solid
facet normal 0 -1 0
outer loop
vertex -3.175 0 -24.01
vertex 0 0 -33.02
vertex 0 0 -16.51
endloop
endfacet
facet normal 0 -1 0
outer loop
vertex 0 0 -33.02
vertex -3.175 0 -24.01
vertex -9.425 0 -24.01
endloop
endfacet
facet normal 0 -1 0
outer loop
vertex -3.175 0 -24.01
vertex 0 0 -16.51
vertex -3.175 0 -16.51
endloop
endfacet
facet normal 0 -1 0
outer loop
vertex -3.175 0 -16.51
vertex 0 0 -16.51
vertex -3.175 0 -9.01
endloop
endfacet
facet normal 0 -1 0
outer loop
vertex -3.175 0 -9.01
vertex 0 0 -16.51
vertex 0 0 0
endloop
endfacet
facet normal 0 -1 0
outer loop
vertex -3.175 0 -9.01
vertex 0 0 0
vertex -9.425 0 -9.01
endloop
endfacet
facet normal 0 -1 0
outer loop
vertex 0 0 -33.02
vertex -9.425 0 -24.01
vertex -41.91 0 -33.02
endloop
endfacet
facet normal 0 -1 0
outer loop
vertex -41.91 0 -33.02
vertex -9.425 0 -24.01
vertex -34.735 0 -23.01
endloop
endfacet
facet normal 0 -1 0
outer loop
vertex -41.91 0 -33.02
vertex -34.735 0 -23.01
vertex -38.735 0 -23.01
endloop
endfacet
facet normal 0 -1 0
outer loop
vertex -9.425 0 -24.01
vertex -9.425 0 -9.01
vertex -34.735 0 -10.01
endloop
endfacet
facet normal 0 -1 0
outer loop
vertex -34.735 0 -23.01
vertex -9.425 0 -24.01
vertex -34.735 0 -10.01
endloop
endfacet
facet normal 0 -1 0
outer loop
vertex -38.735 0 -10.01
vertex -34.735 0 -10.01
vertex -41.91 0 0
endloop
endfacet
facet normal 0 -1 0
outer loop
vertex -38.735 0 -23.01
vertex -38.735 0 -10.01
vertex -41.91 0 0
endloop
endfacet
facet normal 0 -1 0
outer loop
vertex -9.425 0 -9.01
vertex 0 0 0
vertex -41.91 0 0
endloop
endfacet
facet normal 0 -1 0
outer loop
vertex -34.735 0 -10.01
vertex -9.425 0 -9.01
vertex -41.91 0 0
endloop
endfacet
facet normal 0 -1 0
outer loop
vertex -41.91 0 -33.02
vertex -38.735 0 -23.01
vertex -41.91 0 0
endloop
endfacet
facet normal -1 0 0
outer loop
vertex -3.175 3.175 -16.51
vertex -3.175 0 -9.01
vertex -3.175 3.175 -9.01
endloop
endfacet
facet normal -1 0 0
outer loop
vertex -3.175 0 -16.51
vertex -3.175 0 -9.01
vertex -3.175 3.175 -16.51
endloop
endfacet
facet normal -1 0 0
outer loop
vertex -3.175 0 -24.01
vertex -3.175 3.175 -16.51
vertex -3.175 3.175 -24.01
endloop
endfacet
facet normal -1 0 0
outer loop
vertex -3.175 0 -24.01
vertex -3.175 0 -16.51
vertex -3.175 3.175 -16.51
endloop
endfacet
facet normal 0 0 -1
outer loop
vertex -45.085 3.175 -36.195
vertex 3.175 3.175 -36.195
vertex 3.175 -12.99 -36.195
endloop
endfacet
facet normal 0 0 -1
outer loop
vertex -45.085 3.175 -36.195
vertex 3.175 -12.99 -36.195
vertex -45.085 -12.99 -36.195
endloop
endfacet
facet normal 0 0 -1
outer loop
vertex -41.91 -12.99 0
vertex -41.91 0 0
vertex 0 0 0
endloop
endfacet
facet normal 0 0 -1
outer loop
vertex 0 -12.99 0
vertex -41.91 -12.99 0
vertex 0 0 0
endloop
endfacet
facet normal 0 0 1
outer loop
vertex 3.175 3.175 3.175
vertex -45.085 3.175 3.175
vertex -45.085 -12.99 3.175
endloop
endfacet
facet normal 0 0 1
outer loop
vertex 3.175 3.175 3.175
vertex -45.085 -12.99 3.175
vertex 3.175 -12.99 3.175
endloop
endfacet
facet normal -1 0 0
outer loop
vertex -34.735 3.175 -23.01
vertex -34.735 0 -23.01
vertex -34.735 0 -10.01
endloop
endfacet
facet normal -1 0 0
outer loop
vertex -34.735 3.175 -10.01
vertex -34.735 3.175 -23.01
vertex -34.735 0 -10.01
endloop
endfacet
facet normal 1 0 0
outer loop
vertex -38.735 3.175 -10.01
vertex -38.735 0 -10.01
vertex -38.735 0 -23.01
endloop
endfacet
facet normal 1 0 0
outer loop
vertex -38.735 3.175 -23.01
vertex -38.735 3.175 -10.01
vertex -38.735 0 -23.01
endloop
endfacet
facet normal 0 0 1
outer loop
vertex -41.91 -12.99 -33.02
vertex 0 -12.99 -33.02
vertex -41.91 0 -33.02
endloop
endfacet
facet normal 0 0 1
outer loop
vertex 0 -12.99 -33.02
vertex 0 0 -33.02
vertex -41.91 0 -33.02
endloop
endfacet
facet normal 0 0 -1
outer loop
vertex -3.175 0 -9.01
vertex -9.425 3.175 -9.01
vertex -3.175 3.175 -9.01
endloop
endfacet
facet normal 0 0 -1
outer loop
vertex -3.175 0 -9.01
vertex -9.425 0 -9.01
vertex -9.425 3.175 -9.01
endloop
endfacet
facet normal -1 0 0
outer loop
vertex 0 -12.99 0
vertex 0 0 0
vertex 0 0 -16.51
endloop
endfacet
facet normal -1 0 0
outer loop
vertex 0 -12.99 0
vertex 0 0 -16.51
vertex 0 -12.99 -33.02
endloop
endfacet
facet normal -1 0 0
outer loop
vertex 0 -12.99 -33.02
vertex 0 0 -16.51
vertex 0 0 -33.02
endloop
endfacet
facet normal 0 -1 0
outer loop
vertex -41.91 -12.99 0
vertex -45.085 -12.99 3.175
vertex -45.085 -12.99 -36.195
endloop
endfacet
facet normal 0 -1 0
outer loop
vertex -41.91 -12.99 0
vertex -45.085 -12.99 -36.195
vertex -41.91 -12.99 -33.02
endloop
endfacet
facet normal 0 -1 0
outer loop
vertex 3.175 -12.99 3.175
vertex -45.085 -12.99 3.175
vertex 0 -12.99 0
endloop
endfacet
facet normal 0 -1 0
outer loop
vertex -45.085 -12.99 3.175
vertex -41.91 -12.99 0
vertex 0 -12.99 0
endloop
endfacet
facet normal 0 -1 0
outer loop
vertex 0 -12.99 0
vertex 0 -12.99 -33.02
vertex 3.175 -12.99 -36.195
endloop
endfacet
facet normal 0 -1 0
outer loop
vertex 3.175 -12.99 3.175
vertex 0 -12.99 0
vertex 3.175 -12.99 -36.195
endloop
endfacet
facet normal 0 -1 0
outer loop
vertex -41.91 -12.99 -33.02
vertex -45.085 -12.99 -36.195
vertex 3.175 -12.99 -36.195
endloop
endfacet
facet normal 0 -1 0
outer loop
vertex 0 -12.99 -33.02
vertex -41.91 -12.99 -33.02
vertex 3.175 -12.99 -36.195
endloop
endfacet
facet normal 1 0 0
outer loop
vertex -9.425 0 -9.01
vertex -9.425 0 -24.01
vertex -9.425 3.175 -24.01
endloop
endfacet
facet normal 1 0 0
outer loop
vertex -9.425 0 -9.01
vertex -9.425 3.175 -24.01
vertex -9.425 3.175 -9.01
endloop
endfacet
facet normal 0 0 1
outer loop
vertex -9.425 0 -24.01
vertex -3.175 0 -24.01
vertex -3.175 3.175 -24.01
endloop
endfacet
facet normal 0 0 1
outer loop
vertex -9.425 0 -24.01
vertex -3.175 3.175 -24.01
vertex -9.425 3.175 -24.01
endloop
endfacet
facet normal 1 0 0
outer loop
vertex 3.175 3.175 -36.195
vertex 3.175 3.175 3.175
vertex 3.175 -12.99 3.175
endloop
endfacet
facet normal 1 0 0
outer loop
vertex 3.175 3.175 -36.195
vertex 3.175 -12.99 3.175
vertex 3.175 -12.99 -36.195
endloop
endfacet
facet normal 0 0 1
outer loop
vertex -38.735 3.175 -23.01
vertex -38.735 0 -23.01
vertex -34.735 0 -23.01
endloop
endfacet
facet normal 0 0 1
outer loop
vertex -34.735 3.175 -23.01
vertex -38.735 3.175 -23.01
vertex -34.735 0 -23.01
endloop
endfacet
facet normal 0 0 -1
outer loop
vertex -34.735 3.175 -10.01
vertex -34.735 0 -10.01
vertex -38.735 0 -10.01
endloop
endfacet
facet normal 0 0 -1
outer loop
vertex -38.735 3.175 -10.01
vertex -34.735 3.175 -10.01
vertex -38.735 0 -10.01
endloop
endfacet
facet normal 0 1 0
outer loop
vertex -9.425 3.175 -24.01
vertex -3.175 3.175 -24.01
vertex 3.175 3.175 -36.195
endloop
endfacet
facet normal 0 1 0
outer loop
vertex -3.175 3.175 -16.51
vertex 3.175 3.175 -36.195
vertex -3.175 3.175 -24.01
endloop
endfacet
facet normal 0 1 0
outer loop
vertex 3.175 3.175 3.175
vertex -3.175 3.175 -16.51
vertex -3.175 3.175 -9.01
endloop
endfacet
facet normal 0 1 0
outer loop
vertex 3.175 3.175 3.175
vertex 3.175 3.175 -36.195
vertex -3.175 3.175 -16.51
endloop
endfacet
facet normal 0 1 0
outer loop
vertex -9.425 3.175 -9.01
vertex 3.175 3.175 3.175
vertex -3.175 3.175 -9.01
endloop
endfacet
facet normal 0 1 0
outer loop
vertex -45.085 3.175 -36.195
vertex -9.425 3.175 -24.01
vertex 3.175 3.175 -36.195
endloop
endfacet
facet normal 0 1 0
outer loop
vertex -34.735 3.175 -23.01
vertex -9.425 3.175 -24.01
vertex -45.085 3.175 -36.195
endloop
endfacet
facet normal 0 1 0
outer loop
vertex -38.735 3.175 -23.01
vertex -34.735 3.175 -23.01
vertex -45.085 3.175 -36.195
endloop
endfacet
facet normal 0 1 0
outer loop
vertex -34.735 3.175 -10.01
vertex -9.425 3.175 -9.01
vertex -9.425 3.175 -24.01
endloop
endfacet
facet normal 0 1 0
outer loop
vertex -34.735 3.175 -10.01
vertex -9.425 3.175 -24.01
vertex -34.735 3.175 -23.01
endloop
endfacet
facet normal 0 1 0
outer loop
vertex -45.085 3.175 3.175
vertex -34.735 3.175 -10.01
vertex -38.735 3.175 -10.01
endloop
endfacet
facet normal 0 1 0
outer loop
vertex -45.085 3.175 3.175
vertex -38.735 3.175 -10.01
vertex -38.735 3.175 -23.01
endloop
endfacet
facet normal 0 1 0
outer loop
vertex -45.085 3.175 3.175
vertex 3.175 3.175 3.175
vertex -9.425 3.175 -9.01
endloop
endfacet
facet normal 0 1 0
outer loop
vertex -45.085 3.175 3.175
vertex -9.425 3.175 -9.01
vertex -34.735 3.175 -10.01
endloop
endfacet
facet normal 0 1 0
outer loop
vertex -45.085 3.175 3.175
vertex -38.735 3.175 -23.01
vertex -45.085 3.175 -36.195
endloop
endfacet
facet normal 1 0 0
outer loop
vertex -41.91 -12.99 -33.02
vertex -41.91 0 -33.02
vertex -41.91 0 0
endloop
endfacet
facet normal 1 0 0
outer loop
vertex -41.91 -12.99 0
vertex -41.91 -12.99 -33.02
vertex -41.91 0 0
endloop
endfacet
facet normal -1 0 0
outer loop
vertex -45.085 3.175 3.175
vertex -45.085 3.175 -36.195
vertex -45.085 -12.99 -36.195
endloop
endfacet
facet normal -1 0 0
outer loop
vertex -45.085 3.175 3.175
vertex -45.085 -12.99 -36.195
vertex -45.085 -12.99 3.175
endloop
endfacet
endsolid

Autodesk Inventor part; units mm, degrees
ref_plane "YZ Plane" through (0, 0, 0) normal (1, 0, 0) x (0, 1, 0)
ref_plane "XZ Plane" through (0, 0, 0) normal (0, 1, 0) x (-1, 0, 0)
ref_plane "XY Plane" through (0, 0, 0) normal (0, 0, 1) x (1, 0, 0)
sketch "Sketch1" plane through (0, 0, 0) normal (0, 1, 0) x (-1, 0, 0)
  line L0 (0, 0) -> (41.91, 0)
  line L1 (41.91, 0) -> (41.91, -33.02)
  line L2 (41.91, -33.02) -> (0, -33.02)
  line L3 (0, -33.02) -> (0, 0)
  line L4 (41.91, -16.51) -> (34.735, -16.51)
  line L5 (34.735, -16.51) -> (34.735, -10.01)
  line L6 (34.735, -10.01) -> (41.91, -10.01)
  line L7 (34.735, -10.01) -> (38.735, -10.01)
  line L8 (38.735, -10.01) -> (38.735, -23.01)
  line L9 (38.735, -23.01) -> (34.735, -23.01)
  line L10 (34.735, -23.01) -> (34.735, -10.01)
  line L11 (0, -16.51) -> (9.425, -16.51)
  line L12 (9.425, -16.51) -> (9.425, -9.01)
  line L13 (9.425, -9.01) -> (3.175, -9.01)
  line L14 (3.175, -9.01) -> (3.175, -24.01)
  line L15 (3.175, -24.01) -> (9.425, -24.01)
  line L16 (9.425, -24.01) -> (9.425, -9.01)
  point P0 (0, -9.01)
  point P1 (0, -24.01)
  point P2 (41.91, -23.01)
  point P3 (3.175, -16.51)
  point P4 (38.735, -16.51)
  dimension "d0" = 41.91
  dimension "d1" = 33.02
  dimension "d2" = 7.175
  dimension "d3" = 6.5
  dimension "d4" = 4
  dimension "d5" = 13
  dimension "d6" = 9.425
  dimension "d7" = 7.5
  dimension "d8" = 6.25
  dimension "d9" = 15
extrude "Extrusion1" add sketch "Sketch1" along normal blind 3.175 contours L0 L1 L6 L5 L10 L9 L8 L4 L2 L3 | L1 L4 L8 L6
sketch "Sketch2" plane through (0, 3.175, 0) normal (0, 1, 0) x (1, 0, 0)
  line L0 (0, 0) -> (0, 33.02) projected
  line L1 (-3.175, 9.01) -> (-9.425, 9.01) projected
  line L2 (-9.425, 9.01) -> (-9.425, 24.01) projected
  line L3 (-9.425, 24.01) -> (-3.175, 24.01) projected
  line L4 (0, 33.02) -> (-41.91, 33.02) projected
  line L5 (-41.91, 33.02) -> (-41.91, 0) projected
  line L6 (-38.735, 23.01) -> (-34.735, 23.01) projected
  line L7 (-34.735, 23.01) -> (-34.735, 10.01) projected
  line L8 (-41.91, 0) -> (0, 0) projected
  line L9 (3.175, -3.175) -> (3.175, 12.185)
  line L10 (3.175, 12.185) -> (-6.25, 12.185)
  line L11 (-6.25, 12.185) -> (-6.25, 20.835)
  line L12 (-6.25, 20.835) -> (3.175, 20.835)
  line L13 (3.175, 20.835) -> (3.175, 36.195)
  line L14 (3.175, 36.195) -> (-45.085, 36.195)
  line L15 (-45.085, 36.195) -> (-45.085, 19.835)
  line L16 (-45.085, 19.835) -> (-37.91, 19.835)
  line L17 (-37.91, 19.835) -> (-37.91, 13.185)
  line L18 (-37.91, 13.185) -> (-45.085, 13.185)
  line L19 (-45.085, 13.185) -> (-45.085, -3.175)
  line L20 (-45.085, -3.175) -> (3.175, -3.175)
  line L21 (3.175, 12.185) -> (3.175, 20.835)
  line L22 (0, 24.01) -> (0, 9.01)
  line L23 (-41.91, 10.01) -> (-41.91, 23.01)
  line L24 (-45.085, 19.835) -> (-45.085, 13.185)
  line L25 (-3.175, 24.01) -> (-3.175, 9.01) projected
  line L26 (-38.735, 10.01) -> (-38.735, 23.01) projected
  line L27 (-34.735, 10.01) -> (-38.735, 10.01) projected
  point P0 (-41.91, 19.835)
  point P1 (0, 20.835)
  point P2 (-3.175, 20.835)
  point P3 (-3.175, 12.185)
  point P4 (0, 12.185)
  point P5 (-41.91, 13.185)
  point P6 (-38.735, 13.185)
  point P7 (-38.735, 19.835)
  dimension "d12" = 3.175
extrude "Extrusion2" add sketch "Sketch2" against normal blind 16.1648 contours L0 L10 L9 L20 L19 L18 L5 L8 | L0 L12 L21 L10 | L0 L4 L5 L16 L15 L14 L13 L12 | L18 L24 L16 L5
properties part number "pololuCaseTop"
